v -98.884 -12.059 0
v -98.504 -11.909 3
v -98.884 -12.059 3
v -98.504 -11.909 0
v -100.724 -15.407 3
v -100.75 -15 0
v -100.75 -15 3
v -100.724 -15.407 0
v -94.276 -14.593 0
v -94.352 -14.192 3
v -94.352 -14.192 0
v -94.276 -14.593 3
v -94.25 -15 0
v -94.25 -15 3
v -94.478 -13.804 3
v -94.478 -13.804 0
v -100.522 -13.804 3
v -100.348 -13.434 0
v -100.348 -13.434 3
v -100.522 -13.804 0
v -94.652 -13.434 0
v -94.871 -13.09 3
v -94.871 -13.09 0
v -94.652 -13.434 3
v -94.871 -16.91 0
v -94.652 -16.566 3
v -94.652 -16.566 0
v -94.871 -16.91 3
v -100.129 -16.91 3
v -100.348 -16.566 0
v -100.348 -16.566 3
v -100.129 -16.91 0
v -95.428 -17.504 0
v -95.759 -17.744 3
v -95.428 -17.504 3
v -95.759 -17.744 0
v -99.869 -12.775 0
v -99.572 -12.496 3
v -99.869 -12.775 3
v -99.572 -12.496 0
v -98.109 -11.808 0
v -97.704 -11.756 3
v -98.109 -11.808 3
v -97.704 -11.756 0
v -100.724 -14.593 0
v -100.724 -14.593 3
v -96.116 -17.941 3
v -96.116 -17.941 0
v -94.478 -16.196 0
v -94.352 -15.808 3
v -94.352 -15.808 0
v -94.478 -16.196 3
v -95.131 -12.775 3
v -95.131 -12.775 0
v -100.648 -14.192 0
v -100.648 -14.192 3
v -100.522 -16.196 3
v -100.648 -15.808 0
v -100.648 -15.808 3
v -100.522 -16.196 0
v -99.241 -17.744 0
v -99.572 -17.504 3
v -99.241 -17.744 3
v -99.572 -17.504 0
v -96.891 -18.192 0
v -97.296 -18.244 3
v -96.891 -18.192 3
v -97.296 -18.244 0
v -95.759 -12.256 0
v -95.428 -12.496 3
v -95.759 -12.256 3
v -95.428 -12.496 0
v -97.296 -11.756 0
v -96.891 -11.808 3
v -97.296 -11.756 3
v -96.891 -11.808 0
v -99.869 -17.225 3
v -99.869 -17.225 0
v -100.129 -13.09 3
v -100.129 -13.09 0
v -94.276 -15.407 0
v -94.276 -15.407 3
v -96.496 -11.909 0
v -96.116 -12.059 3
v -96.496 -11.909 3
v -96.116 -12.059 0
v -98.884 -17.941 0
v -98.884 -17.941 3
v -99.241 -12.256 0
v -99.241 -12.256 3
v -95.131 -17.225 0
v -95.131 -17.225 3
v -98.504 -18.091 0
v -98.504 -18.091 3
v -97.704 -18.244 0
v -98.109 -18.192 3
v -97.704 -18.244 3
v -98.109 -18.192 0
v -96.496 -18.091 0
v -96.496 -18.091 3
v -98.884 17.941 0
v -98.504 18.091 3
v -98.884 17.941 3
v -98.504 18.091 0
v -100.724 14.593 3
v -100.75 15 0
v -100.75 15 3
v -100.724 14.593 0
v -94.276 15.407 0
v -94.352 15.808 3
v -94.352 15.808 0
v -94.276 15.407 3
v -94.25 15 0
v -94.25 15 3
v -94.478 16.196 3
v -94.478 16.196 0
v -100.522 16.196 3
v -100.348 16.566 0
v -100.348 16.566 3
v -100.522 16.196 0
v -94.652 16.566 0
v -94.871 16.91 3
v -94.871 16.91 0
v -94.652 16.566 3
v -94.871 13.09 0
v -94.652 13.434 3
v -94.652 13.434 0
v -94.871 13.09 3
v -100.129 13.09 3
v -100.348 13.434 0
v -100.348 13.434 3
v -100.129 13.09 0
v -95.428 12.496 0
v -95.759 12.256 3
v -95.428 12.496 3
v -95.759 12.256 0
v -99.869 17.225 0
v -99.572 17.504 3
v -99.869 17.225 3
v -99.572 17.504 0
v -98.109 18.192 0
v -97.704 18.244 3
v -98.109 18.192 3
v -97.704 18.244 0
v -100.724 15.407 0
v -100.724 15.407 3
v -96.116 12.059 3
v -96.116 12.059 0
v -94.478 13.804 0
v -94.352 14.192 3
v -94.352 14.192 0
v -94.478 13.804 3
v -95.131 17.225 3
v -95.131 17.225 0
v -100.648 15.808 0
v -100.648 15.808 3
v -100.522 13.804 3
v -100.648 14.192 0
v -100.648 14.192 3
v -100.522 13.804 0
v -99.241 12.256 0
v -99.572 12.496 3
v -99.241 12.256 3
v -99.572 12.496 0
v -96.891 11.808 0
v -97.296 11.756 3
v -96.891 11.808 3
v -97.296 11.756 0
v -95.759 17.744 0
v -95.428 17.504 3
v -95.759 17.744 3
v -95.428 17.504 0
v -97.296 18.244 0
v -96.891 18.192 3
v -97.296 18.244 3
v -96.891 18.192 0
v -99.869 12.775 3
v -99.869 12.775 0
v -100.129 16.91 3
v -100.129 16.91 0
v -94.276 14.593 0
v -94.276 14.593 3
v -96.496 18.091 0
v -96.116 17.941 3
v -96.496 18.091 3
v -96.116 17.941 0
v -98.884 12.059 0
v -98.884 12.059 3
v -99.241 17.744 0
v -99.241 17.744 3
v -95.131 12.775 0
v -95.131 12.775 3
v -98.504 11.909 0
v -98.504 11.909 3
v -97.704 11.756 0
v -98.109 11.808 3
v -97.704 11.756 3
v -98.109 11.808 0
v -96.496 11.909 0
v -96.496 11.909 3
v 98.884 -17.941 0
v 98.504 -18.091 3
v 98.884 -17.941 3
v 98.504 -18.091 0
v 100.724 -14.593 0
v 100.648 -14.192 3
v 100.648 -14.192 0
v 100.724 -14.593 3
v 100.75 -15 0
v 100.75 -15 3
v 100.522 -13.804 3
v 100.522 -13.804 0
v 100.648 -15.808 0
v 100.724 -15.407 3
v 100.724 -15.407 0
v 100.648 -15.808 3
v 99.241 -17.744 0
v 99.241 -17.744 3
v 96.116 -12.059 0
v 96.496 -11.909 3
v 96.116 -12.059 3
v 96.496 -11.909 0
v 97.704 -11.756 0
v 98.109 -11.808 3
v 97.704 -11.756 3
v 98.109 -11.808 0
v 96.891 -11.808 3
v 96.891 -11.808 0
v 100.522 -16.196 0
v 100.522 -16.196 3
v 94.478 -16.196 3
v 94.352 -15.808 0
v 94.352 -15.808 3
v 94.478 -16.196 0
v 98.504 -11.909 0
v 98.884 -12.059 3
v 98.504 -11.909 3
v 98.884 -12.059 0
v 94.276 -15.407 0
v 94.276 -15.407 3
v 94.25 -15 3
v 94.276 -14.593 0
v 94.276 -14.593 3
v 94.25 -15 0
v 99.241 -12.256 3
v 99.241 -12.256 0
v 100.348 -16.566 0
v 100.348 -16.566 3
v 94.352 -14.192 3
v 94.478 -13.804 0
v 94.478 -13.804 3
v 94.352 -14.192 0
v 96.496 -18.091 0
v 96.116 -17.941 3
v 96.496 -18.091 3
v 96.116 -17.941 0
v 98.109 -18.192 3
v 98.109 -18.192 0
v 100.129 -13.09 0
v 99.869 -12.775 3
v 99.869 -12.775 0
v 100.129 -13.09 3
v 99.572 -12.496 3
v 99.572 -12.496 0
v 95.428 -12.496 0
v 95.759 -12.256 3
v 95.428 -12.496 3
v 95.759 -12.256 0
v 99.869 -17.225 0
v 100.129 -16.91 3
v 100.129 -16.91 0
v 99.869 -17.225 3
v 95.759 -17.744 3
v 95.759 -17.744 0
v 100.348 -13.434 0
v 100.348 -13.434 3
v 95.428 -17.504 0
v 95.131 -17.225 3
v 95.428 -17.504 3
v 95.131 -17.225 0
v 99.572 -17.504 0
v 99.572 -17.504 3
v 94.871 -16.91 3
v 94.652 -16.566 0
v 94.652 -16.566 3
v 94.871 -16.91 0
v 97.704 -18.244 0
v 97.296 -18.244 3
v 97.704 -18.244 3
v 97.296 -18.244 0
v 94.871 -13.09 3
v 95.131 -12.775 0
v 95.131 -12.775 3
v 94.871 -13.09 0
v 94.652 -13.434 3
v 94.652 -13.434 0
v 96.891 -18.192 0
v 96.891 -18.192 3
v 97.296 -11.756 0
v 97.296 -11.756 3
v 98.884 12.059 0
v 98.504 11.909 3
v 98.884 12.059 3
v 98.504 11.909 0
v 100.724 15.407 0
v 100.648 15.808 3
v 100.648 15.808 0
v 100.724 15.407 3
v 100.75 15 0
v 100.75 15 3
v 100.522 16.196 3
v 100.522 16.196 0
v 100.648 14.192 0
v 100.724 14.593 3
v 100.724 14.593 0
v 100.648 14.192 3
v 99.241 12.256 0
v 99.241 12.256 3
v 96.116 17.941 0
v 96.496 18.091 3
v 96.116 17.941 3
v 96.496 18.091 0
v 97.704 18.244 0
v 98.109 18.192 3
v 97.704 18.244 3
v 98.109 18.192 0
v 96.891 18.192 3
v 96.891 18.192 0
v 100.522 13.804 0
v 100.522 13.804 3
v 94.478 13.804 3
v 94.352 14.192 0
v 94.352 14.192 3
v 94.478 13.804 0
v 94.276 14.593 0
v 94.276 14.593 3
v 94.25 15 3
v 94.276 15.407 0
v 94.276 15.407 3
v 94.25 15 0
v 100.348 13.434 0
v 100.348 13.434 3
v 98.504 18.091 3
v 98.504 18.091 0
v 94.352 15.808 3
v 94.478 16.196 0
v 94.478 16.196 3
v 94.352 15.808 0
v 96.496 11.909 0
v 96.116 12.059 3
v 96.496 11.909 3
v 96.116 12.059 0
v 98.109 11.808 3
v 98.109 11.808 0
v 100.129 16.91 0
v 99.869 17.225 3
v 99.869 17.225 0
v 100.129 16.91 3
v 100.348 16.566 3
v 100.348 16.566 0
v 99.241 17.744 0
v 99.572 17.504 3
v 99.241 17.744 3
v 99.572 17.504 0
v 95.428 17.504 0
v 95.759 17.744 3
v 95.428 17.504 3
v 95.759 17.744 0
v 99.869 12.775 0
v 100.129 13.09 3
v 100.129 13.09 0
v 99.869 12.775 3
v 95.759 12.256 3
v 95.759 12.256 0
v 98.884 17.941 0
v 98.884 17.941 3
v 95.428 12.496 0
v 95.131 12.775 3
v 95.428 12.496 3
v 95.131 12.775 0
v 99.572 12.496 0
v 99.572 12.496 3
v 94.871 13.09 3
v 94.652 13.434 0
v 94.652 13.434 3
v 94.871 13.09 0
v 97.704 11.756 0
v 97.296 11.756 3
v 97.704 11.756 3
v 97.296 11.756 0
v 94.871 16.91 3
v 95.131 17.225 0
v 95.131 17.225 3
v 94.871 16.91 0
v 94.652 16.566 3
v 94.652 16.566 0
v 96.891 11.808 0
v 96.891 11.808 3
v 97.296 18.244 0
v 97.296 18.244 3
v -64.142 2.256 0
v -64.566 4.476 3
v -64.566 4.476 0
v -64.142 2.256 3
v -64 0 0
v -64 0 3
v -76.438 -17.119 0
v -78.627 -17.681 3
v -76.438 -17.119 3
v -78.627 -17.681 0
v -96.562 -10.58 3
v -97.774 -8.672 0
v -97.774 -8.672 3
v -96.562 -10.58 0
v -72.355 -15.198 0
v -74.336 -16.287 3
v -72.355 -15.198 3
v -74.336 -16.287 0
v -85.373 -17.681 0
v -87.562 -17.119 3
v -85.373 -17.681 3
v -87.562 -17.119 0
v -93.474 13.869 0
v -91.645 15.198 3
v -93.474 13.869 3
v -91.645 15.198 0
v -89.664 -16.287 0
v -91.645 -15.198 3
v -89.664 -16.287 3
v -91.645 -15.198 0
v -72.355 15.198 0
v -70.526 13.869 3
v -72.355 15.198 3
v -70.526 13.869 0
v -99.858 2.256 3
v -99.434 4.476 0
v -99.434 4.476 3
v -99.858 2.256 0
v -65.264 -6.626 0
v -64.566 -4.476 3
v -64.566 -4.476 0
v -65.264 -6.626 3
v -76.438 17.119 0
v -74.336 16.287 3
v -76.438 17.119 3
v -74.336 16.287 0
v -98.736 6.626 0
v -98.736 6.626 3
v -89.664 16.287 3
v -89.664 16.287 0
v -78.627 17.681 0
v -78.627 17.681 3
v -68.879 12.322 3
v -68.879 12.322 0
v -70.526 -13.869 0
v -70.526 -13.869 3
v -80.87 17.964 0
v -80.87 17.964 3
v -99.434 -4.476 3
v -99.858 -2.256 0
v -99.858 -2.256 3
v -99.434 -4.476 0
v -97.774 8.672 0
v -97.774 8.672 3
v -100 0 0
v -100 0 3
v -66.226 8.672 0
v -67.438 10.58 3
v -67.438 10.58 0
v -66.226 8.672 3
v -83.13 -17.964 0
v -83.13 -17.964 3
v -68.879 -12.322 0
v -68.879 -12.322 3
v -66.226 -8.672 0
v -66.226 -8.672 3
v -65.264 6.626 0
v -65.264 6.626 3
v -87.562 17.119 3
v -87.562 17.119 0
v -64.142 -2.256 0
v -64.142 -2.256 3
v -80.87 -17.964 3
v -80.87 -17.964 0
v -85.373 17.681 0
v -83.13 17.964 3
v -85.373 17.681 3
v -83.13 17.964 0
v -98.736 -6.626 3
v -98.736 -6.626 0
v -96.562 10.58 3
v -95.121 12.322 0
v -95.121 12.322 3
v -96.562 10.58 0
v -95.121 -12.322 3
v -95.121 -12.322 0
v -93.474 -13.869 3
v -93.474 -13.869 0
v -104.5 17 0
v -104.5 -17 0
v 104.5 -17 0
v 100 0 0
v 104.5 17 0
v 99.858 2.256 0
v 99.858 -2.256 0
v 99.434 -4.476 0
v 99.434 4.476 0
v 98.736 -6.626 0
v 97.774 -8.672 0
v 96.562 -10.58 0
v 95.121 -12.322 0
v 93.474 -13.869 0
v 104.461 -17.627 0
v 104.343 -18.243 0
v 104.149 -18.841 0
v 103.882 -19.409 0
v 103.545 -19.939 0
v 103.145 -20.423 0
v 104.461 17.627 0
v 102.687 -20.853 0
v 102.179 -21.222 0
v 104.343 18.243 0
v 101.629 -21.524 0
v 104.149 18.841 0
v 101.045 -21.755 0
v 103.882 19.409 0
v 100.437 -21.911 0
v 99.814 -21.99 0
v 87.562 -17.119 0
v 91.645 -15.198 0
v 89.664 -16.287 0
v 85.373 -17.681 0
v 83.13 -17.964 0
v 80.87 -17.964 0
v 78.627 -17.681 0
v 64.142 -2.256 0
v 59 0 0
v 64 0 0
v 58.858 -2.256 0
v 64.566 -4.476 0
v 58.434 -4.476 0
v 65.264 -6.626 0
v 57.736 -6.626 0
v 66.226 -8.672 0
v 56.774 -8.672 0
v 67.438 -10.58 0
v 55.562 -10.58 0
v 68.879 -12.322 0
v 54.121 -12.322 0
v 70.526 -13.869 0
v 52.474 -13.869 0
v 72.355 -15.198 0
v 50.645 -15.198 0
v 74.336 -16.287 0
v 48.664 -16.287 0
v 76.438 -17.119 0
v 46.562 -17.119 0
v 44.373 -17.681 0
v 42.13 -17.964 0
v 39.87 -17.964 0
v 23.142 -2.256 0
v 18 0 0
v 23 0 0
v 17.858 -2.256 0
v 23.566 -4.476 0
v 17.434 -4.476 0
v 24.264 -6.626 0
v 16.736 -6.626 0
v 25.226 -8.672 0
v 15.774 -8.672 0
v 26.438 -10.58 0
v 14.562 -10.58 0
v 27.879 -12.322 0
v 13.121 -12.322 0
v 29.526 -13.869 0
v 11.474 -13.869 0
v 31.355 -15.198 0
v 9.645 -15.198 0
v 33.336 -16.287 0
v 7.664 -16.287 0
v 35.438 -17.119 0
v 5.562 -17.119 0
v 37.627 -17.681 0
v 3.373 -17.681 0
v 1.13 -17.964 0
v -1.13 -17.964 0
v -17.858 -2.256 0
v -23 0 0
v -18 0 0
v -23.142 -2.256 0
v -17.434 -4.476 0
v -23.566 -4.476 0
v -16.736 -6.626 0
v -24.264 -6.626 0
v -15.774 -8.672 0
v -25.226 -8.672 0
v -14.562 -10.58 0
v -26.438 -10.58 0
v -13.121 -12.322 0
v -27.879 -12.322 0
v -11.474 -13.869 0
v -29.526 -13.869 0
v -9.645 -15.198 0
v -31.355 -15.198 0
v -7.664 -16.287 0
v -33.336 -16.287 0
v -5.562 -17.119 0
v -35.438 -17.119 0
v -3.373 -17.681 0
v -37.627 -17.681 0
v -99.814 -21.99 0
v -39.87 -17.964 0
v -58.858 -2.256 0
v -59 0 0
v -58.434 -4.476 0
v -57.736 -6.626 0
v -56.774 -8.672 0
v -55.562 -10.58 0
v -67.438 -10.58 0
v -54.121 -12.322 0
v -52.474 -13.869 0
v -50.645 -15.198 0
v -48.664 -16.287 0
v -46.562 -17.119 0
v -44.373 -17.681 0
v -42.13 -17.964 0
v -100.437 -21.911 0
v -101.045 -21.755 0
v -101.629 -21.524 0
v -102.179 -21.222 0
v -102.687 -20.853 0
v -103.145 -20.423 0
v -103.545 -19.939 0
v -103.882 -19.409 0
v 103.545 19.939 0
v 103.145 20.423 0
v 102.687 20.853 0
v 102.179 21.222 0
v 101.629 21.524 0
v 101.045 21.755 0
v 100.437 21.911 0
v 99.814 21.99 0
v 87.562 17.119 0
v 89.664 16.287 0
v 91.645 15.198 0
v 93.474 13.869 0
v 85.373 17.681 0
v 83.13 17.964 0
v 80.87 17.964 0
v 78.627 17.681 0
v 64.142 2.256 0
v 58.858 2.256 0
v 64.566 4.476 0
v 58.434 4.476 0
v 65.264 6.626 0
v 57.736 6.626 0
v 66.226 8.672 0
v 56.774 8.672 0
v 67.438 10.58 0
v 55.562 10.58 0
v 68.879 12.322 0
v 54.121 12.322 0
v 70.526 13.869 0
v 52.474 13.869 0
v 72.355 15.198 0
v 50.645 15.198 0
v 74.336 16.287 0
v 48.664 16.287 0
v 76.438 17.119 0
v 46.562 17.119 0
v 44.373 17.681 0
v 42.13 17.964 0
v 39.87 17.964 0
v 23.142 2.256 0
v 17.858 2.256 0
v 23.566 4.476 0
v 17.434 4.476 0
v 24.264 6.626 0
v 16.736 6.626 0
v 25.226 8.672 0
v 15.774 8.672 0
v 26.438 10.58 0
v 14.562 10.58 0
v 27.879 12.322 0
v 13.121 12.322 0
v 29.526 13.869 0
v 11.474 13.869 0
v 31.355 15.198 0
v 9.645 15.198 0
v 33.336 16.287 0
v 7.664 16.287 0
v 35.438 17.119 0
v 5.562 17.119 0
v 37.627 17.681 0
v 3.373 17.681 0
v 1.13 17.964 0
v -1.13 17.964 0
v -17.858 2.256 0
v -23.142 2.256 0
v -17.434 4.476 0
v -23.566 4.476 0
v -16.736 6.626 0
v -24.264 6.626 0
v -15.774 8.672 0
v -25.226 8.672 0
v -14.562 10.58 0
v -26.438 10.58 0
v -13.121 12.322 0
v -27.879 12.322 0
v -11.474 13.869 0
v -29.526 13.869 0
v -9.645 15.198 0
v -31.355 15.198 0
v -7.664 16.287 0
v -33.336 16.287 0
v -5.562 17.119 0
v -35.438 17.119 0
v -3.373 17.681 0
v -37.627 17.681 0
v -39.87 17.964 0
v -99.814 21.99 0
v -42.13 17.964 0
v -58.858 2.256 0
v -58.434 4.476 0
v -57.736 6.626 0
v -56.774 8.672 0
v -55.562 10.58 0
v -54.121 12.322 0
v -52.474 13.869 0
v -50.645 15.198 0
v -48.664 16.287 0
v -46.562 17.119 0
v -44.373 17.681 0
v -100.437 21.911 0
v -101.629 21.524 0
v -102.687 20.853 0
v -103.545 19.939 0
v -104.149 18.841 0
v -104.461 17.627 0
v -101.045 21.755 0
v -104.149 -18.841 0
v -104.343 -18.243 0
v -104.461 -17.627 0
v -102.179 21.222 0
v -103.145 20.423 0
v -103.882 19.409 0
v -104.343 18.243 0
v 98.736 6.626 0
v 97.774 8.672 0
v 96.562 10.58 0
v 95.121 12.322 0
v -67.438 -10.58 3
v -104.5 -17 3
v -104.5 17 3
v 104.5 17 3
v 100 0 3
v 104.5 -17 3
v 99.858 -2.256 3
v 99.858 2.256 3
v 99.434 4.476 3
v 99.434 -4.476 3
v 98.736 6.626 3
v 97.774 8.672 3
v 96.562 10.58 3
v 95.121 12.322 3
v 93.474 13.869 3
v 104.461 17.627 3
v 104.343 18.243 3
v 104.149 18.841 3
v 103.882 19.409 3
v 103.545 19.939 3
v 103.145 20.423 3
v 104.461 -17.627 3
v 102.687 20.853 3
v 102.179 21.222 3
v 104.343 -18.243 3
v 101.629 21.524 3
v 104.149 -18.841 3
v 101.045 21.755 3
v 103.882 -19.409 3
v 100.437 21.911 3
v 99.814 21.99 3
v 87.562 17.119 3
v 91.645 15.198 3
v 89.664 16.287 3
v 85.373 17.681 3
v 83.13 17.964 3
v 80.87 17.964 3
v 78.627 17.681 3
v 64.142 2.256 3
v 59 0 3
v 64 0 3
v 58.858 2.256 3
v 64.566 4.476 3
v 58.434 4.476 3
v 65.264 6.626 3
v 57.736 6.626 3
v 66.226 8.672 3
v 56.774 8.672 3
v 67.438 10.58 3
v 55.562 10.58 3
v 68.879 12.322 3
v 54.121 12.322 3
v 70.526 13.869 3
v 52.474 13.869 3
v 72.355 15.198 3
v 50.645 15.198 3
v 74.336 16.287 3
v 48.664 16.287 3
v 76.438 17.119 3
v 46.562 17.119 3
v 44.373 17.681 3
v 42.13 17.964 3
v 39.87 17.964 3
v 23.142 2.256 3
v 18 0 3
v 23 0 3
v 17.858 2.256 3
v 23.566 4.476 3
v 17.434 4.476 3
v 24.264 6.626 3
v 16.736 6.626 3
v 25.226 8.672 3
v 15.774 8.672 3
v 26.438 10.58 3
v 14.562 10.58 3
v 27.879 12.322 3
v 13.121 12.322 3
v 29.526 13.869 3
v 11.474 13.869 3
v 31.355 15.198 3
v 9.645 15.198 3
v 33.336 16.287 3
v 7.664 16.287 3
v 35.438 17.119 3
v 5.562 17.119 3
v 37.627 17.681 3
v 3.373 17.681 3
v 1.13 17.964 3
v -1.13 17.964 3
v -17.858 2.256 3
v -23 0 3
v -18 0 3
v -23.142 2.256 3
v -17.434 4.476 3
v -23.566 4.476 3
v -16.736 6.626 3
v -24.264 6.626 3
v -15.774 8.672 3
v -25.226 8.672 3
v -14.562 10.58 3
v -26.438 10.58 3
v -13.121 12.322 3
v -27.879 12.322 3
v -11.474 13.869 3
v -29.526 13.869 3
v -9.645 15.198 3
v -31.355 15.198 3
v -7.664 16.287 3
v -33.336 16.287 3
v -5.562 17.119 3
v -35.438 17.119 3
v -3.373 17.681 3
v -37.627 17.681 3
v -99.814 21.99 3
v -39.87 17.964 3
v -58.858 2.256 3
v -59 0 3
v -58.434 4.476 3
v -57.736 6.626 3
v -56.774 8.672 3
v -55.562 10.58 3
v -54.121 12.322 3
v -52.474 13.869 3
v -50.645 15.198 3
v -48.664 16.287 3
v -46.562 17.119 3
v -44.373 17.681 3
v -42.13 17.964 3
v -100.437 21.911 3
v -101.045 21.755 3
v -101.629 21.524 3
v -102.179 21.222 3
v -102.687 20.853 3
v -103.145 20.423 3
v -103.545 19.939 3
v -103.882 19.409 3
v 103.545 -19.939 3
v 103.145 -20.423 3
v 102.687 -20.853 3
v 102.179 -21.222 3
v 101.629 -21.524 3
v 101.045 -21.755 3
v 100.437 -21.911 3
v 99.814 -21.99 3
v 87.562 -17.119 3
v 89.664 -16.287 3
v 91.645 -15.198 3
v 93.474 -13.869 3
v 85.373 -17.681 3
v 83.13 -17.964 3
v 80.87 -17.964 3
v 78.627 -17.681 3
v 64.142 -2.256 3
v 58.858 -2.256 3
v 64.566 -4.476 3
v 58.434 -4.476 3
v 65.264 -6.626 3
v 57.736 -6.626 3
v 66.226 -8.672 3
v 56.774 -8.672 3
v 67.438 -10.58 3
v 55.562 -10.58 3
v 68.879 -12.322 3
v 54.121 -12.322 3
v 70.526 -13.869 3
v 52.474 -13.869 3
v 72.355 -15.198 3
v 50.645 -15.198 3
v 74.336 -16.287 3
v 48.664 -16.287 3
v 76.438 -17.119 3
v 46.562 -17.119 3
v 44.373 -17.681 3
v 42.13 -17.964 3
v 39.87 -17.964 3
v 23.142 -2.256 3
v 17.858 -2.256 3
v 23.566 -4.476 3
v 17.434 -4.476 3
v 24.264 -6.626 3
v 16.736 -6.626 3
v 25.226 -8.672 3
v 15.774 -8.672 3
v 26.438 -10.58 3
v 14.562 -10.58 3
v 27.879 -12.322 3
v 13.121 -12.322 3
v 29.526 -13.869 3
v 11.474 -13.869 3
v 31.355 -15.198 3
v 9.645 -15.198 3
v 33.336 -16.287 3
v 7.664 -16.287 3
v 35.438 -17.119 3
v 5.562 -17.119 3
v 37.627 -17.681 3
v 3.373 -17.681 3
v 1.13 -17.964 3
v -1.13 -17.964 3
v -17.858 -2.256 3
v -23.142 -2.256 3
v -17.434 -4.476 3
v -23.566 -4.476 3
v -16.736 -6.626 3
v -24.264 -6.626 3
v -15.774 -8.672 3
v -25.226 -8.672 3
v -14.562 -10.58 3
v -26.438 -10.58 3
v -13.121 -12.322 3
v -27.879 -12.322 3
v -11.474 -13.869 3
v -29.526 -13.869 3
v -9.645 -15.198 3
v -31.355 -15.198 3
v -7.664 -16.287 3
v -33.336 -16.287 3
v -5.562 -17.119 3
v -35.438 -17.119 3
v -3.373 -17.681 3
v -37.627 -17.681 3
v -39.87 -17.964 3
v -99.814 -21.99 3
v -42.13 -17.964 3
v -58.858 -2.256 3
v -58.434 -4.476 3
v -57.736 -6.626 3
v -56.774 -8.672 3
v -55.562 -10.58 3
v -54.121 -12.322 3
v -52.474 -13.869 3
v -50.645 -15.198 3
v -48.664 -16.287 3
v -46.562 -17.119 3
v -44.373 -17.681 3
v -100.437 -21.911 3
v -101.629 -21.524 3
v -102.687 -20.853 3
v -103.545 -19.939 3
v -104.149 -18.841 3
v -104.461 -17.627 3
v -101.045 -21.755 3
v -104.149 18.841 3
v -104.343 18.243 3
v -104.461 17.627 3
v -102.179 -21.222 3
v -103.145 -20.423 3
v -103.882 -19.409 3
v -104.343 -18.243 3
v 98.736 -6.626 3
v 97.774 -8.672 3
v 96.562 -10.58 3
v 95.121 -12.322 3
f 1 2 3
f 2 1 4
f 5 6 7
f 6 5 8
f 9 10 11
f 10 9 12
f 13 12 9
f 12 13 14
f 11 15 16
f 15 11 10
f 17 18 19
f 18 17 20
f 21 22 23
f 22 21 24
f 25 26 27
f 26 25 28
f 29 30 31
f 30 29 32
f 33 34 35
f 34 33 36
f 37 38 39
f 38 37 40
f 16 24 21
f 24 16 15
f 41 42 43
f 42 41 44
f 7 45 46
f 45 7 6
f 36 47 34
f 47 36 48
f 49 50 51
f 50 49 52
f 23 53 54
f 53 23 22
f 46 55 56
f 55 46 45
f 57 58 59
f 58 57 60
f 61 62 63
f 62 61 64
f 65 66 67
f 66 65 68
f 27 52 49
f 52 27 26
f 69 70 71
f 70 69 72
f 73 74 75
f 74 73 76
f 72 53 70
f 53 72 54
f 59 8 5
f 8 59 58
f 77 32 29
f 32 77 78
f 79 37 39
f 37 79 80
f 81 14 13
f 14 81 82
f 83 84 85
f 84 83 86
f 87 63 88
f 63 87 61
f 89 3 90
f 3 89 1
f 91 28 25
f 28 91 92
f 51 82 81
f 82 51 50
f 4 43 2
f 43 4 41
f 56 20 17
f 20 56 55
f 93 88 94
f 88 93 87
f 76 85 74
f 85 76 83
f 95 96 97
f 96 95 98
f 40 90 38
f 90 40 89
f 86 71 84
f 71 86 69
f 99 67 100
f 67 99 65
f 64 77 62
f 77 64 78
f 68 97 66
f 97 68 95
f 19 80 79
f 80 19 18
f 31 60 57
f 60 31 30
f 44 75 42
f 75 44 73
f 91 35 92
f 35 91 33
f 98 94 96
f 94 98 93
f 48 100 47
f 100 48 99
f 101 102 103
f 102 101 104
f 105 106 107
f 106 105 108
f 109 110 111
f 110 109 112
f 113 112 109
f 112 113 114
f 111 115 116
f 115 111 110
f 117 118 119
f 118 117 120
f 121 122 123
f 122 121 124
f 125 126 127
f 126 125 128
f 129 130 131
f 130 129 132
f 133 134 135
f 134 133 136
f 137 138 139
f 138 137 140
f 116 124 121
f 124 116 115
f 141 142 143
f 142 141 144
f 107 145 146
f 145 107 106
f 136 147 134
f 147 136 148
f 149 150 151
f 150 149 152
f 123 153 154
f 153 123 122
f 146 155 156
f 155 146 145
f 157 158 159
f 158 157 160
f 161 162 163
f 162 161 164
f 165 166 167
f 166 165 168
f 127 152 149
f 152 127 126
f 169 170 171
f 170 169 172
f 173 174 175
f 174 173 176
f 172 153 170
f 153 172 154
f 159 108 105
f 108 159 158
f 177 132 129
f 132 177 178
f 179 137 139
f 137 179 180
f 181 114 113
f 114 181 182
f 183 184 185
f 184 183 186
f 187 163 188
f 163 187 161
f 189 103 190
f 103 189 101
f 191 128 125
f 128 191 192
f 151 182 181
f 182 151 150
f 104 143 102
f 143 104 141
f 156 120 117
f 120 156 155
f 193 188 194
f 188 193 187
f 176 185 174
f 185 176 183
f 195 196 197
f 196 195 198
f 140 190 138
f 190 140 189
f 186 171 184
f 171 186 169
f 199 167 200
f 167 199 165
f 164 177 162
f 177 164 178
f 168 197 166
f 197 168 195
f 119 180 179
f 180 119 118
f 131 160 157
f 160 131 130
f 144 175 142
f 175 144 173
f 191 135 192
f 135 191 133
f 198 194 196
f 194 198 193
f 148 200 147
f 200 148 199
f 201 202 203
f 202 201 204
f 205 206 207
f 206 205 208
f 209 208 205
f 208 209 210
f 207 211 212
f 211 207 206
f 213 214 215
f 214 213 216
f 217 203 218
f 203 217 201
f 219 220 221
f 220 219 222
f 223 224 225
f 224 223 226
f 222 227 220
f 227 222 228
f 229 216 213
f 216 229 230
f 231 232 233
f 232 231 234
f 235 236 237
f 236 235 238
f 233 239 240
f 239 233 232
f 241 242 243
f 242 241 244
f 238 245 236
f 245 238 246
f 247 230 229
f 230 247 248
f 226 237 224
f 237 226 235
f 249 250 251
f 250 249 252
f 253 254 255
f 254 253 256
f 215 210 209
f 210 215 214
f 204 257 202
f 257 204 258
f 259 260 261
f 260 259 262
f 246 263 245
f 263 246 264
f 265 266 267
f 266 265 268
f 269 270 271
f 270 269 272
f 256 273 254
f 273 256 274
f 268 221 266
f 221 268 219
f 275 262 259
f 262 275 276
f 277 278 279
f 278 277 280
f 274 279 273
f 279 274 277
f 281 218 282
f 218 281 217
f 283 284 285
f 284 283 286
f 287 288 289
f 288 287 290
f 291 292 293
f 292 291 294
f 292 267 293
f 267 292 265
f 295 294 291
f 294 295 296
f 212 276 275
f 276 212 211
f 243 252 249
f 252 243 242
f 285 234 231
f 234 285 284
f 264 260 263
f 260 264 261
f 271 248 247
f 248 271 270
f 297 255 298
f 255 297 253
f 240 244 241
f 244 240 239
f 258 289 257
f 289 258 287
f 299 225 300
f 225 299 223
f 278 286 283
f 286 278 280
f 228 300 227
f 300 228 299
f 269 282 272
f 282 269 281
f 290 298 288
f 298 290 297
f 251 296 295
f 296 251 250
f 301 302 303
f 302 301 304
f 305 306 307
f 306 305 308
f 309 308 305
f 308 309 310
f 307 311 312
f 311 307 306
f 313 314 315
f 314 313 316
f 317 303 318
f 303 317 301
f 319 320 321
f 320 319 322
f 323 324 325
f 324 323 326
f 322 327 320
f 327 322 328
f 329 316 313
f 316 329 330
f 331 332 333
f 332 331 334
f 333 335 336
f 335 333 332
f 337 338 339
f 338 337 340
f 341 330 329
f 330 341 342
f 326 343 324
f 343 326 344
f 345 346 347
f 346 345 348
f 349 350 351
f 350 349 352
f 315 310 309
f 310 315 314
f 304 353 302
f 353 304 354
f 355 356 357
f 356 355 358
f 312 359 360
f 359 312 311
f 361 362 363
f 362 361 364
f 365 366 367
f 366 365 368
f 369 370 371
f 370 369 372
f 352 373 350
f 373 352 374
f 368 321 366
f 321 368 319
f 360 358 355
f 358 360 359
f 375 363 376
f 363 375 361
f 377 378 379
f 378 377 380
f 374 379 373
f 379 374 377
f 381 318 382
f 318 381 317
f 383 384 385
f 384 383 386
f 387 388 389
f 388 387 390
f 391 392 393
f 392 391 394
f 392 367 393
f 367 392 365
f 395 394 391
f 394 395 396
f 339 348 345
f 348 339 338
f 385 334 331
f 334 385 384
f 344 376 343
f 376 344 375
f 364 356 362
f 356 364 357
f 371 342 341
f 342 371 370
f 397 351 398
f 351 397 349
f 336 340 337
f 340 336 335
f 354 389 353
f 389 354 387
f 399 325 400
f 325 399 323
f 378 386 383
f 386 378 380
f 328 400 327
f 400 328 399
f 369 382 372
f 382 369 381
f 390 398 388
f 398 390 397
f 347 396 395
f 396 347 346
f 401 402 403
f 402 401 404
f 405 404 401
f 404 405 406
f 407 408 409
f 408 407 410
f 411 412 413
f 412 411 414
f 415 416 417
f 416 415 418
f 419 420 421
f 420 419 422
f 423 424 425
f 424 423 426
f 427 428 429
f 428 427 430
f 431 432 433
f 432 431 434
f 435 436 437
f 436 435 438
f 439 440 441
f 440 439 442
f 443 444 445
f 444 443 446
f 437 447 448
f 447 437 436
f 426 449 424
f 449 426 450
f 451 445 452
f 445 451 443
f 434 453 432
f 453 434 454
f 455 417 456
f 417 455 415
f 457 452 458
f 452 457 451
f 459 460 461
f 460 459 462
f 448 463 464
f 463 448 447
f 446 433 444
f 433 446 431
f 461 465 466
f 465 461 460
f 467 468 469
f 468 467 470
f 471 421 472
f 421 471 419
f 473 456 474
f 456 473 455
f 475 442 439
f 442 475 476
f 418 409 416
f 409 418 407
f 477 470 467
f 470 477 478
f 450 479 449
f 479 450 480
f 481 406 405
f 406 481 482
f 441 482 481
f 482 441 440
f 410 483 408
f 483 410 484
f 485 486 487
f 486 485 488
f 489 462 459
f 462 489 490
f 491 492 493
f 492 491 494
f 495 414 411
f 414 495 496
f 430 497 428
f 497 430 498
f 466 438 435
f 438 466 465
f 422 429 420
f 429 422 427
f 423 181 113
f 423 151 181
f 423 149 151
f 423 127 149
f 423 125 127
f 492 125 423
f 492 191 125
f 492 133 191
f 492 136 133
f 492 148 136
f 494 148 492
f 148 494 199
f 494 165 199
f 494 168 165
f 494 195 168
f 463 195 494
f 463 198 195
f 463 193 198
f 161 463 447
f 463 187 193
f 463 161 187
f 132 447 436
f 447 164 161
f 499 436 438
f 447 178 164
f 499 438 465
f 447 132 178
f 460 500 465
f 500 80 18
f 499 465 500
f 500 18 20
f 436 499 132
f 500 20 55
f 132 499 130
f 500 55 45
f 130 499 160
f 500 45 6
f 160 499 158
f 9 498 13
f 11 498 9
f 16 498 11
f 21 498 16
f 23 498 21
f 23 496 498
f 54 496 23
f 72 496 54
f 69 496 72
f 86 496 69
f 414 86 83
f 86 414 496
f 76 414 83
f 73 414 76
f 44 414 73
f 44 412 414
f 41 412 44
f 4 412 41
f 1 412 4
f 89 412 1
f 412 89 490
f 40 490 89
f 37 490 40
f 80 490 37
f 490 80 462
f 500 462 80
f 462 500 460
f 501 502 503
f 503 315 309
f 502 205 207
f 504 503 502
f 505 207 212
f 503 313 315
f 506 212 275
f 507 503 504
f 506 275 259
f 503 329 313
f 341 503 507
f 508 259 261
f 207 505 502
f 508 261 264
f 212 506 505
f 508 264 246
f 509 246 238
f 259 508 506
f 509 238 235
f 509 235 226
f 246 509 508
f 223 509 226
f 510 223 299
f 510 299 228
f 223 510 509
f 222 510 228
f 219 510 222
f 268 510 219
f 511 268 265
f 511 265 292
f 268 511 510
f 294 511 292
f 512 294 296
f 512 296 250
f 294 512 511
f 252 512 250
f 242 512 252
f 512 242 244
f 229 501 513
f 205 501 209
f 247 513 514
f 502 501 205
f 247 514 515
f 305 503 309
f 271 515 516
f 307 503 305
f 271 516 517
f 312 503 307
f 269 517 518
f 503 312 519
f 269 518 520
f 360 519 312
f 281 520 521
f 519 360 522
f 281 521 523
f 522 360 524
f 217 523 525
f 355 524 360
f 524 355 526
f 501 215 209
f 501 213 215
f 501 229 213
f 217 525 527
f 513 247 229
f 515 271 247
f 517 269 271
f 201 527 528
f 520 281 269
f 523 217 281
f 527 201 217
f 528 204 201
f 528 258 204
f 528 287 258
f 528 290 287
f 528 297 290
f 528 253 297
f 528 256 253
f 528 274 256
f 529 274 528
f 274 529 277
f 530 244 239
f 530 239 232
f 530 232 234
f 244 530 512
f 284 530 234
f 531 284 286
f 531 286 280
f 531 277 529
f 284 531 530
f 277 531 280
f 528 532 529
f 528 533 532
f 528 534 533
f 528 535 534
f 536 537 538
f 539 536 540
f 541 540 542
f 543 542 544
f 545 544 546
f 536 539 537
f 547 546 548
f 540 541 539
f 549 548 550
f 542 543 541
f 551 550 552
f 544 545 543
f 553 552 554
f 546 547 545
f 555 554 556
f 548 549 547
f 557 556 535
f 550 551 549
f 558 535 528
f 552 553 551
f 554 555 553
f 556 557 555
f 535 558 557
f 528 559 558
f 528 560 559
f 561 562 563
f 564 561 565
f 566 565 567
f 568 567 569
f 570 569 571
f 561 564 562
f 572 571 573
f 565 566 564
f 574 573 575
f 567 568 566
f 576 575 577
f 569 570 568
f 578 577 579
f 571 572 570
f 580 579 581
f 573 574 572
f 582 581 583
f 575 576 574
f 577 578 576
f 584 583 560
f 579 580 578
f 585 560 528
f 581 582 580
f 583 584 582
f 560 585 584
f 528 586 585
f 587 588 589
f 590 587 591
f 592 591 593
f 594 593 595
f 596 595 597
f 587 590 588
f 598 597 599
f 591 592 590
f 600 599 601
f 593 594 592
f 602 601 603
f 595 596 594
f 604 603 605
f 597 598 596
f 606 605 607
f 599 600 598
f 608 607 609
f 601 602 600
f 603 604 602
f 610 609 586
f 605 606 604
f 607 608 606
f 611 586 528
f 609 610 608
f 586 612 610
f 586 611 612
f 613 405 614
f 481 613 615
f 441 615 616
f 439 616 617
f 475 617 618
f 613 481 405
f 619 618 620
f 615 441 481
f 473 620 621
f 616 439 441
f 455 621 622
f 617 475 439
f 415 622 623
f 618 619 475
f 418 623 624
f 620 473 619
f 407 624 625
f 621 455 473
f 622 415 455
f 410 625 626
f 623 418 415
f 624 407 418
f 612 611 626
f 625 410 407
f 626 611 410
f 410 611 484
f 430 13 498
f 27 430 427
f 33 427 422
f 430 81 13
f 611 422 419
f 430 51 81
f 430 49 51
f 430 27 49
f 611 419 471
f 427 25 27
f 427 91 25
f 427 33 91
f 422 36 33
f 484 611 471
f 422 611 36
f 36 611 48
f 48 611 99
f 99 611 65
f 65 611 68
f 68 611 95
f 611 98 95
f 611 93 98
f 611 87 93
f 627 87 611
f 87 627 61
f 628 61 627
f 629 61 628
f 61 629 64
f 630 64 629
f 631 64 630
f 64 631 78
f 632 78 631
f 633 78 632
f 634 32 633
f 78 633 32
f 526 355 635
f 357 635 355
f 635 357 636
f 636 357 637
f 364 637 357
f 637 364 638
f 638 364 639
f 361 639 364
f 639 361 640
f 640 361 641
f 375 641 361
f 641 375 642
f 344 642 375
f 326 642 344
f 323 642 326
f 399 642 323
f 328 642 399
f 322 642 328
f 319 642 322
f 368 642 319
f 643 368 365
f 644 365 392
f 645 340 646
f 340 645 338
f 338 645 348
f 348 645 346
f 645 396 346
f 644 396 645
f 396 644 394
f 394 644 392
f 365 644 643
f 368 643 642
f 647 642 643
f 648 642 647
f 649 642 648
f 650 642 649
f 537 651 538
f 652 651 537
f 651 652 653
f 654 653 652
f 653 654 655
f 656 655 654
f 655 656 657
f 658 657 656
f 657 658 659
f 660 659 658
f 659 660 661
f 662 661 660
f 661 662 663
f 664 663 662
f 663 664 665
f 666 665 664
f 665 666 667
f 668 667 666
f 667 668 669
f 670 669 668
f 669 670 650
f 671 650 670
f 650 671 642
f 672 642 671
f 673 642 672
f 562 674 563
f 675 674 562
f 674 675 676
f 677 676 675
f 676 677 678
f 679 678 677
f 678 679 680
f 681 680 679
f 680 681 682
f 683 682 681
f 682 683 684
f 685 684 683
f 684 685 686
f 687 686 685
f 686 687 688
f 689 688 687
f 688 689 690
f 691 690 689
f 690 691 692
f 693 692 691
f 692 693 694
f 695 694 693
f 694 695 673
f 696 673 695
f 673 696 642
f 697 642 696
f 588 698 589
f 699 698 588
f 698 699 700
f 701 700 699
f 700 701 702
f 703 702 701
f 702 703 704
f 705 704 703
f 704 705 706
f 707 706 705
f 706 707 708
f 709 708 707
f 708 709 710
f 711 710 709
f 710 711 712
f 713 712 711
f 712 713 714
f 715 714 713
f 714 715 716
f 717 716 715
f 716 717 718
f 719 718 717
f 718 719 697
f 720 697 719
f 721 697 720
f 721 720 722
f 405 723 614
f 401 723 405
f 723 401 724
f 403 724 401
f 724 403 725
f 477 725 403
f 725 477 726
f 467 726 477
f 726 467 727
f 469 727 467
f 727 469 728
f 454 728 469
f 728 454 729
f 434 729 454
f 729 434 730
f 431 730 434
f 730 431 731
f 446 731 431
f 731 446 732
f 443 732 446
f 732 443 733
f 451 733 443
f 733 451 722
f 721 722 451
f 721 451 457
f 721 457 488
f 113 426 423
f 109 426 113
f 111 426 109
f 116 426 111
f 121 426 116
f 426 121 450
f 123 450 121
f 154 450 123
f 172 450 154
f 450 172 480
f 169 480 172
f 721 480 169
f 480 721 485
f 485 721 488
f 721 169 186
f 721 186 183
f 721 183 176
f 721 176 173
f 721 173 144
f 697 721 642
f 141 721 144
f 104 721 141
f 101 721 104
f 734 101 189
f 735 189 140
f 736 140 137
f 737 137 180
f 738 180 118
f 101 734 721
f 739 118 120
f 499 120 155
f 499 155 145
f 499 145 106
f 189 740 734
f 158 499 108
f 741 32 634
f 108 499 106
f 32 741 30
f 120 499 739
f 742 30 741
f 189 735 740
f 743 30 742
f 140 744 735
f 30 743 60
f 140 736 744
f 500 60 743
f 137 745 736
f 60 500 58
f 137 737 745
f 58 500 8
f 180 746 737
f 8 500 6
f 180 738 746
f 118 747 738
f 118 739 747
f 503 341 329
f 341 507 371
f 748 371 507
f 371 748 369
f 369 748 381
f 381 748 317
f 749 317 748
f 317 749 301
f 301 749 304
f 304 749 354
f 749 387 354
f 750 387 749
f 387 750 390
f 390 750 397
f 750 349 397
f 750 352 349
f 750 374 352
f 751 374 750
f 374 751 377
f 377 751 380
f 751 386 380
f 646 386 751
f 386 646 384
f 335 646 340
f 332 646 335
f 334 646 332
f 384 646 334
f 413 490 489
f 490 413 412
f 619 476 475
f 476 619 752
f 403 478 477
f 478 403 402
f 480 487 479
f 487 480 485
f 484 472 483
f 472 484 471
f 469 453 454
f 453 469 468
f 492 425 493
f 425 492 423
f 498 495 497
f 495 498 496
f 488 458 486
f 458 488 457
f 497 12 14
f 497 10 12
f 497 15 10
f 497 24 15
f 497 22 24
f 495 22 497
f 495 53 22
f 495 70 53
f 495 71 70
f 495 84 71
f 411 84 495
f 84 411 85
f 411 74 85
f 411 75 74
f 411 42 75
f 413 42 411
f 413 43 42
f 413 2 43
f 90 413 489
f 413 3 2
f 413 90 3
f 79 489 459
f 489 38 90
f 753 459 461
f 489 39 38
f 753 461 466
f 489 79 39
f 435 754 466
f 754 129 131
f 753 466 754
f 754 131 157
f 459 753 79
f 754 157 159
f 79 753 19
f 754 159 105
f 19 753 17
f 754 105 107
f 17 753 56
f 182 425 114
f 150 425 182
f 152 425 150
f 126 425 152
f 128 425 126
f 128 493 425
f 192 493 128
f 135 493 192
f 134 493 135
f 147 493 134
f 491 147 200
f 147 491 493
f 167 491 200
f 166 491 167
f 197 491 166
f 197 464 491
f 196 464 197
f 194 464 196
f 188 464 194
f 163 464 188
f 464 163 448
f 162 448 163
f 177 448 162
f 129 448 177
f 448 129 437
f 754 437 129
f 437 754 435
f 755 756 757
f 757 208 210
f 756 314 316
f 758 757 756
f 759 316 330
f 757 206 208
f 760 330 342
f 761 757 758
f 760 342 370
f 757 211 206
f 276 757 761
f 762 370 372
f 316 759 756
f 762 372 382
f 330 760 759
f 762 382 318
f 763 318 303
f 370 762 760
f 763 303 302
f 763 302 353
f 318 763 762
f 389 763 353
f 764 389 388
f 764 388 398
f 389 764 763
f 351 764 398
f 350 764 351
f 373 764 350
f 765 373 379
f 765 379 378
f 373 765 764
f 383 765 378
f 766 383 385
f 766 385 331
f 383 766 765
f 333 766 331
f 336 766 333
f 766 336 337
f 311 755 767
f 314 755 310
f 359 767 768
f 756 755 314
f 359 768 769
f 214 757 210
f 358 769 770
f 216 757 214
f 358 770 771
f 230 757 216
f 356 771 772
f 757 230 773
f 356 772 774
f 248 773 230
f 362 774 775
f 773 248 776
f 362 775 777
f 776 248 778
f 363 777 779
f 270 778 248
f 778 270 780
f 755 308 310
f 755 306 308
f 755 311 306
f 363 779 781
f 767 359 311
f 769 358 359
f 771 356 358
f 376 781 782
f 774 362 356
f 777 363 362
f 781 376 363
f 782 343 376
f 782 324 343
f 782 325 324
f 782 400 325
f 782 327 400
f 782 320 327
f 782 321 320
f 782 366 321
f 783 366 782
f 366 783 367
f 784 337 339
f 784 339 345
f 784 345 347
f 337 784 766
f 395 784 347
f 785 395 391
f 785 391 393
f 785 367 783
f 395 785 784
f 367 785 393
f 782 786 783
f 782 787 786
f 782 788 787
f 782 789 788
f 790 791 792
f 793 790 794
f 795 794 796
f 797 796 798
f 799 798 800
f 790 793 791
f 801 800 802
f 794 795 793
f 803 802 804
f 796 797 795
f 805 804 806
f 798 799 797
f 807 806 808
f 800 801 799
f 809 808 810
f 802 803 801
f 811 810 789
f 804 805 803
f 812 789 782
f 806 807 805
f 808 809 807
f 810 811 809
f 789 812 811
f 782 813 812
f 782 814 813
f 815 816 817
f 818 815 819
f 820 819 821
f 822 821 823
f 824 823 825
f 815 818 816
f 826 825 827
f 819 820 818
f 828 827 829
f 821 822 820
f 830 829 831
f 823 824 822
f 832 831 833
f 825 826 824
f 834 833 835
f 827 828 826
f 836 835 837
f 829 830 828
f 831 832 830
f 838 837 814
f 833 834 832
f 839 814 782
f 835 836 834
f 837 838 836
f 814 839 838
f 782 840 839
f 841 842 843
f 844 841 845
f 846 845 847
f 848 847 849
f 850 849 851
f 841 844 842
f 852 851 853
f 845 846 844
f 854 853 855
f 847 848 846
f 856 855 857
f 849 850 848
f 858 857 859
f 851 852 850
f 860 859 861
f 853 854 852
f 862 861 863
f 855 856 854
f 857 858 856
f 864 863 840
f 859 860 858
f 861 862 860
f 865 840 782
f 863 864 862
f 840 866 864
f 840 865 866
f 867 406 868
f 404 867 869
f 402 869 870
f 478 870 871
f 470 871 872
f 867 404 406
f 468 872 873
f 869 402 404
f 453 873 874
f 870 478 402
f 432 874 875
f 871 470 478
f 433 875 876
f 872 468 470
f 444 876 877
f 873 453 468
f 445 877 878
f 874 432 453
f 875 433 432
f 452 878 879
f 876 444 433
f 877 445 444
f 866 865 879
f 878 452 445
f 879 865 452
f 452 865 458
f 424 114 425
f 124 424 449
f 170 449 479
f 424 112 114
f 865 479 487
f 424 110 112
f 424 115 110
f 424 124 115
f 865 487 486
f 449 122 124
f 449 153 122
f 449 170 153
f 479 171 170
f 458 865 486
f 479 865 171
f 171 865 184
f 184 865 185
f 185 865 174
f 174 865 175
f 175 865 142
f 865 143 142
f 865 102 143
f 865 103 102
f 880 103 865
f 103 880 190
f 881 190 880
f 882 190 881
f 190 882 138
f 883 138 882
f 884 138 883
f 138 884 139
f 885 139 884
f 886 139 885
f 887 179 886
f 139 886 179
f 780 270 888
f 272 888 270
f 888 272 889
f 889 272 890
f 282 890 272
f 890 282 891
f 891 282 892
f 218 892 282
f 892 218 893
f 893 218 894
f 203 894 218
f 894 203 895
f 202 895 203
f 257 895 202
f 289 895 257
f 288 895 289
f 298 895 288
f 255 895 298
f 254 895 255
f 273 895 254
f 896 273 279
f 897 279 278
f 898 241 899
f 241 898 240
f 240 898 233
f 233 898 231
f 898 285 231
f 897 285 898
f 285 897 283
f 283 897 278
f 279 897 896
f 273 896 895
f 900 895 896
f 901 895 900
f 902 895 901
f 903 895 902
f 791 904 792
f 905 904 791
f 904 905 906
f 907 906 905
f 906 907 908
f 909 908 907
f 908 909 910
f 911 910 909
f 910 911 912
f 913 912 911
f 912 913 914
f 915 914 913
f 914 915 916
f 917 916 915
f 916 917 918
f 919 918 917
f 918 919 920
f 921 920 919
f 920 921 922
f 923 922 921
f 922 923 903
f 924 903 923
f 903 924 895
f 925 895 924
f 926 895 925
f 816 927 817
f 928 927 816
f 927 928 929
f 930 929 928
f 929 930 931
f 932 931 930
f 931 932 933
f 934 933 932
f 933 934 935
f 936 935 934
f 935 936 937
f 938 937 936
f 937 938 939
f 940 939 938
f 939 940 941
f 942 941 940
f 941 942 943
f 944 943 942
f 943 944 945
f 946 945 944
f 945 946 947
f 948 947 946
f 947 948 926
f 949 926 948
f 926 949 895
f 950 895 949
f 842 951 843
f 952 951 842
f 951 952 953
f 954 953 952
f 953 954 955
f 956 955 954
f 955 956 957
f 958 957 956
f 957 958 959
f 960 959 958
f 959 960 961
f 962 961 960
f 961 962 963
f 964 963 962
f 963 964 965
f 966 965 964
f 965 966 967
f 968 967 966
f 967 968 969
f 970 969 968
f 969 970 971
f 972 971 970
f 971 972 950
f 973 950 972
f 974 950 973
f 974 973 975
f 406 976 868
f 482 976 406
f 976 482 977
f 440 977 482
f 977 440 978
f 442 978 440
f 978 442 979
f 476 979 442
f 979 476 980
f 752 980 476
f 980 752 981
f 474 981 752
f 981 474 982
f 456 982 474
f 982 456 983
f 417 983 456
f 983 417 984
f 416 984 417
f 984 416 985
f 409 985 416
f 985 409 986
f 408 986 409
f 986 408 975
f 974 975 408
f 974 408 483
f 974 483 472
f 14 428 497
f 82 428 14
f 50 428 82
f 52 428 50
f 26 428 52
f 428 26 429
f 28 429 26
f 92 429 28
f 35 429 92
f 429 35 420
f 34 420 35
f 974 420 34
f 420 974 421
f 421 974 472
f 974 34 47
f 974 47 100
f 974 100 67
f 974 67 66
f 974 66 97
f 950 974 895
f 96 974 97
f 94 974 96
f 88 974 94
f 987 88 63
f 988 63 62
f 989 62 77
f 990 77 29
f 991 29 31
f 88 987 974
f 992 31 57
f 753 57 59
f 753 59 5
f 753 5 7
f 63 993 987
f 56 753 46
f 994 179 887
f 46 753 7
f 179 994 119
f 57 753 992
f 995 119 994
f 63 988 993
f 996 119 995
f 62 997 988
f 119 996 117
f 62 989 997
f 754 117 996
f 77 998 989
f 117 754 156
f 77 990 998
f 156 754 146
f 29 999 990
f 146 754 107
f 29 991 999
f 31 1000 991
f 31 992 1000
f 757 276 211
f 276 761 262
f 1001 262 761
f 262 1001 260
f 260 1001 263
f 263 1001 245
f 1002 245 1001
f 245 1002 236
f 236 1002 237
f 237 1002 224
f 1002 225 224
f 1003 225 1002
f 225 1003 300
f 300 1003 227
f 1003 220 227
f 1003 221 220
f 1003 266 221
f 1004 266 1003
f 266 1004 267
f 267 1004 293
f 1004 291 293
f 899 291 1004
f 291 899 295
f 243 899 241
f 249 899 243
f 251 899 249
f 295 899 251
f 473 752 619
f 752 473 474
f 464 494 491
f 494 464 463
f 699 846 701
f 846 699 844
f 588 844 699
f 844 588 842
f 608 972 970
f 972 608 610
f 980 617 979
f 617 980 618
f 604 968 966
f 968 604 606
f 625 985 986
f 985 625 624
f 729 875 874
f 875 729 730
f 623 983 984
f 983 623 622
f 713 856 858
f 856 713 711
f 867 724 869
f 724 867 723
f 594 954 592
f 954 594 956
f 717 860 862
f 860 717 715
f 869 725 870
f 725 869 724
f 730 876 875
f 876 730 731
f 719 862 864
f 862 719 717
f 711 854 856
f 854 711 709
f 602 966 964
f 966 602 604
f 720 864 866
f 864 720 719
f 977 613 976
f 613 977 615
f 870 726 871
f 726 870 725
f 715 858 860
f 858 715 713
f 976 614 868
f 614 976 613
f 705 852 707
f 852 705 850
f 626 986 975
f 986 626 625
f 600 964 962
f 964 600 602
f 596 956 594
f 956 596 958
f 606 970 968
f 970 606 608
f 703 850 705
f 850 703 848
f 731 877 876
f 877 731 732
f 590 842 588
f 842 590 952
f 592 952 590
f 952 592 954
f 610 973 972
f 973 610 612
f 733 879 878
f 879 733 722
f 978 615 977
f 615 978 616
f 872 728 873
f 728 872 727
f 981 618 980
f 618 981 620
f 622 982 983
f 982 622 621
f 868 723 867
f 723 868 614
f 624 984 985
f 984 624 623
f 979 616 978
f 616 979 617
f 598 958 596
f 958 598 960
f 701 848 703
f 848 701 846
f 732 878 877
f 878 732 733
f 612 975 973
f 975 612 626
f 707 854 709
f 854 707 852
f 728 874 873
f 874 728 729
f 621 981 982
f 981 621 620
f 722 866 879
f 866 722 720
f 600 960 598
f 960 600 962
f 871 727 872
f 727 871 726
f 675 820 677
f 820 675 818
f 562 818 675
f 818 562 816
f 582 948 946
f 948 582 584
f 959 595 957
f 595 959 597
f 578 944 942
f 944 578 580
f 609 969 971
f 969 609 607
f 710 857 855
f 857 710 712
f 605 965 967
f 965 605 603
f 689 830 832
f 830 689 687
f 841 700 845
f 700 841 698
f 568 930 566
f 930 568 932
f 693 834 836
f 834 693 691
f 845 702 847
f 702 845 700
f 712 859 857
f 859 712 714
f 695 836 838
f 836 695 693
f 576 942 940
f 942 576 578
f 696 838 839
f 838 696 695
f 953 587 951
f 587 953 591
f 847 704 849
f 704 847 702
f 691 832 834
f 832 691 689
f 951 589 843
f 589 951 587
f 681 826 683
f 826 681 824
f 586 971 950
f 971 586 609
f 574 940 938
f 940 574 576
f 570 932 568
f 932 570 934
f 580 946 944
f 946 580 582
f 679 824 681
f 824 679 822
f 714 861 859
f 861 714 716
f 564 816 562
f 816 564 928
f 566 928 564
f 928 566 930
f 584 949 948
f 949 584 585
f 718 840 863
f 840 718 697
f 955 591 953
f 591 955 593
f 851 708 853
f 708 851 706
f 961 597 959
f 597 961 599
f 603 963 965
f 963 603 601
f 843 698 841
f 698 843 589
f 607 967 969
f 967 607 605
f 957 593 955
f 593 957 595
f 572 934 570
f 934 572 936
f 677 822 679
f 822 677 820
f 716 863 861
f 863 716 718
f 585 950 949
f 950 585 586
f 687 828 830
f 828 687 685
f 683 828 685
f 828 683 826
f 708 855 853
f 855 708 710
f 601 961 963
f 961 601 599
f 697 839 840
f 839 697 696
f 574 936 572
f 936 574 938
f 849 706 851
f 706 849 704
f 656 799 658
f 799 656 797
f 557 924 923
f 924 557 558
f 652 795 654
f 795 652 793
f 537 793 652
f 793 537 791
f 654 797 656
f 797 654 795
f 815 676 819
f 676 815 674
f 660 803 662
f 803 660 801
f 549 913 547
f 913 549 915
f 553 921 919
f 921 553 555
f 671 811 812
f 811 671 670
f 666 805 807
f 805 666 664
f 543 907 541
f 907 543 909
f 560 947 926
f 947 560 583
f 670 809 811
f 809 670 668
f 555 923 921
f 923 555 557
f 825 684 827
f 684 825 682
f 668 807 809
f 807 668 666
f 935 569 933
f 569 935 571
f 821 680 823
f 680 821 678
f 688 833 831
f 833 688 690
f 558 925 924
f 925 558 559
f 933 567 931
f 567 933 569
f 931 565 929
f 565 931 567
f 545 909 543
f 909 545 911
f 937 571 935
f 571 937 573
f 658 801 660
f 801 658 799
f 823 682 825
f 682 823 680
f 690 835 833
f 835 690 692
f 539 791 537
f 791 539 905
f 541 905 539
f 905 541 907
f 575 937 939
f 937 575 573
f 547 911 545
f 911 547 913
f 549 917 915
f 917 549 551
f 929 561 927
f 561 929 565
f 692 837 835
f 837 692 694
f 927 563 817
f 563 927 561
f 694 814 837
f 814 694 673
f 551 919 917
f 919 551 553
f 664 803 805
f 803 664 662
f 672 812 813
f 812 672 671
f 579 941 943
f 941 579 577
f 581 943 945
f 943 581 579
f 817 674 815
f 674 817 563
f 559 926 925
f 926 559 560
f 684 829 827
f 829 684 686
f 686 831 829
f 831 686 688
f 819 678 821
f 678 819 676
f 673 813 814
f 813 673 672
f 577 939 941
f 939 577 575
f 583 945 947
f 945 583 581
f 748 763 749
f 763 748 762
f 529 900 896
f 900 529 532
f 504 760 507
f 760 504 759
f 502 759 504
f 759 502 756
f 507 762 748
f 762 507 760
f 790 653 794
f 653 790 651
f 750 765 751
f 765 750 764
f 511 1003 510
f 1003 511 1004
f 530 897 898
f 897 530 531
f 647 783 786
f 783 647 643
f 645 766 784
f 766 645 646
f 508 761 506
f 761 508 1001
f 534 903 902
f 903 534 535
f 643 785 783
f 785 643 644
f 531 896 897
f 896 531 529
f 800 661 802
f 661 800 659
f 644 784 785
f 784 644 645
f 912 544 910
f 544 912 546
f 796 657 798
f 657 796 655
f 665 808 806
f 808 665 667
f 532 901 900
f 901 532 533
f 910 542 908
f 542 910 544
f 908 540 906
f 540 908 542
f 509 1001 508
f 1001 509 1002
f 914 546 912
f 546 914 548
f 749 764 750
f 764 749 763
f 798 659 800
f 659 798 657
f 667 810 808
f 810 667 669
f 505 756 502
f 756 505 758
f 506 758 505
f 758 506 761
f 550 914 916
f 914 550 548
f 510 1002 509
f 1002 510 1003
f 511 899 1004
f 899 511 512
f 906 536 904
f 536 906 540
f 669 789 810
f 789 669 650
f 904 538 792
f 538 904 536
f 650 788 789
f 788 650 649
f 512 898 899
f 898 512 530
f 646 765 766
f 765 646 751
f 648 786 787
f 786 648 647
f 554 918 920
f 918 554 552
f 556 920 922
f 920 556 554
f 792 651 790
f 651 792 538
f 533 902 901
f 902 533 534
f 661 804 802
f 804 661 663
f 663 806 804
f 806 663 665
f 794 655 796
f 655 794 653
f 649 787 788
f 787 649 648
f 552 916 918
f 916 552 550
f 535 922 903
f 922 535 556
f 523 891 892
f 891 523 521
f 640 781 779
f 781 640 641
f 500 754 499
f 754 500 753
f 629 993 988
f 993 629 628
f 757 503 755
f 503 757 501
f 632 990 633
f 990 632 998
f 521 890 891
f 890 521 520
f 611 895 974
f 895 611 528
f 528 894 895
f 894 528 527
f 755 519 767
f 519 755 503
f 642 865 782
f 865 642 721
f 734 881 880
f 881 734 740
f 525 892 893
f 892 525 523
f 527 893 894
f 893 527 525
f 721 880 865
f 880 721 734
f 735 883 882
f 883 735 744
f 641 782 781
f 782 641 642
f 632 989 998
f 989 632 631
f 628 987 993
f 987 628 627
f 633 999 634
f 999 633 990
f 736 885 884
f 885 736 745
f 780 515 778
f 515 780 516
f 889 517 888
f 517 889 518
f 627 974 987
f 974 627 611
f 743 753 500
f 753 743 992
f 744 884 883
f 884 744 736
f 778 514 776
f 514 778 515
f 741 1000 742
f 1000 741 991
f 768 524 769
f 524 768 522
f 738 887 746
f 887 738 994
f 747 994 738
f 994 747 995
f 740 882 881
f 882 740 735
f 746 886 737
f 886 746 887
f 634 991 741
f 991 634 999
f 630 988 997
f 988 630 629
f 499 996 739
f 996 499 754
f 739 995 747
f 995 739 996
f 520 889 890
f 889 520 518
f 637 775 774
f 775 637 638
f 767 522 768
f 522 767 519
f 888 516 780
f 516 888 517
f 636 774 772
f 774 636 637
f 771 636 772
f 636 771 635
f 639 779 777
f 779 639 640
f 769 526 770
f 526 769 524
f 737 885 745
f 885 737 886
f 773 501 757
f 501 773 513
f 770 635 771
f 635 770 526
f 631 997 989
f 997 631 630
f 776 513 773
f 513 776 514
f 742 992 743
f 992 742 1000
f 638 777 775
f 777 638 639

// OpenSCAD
$fn = 50;


difference() {
	union() {
		hull() {
			translate(v = [-99.5000000000, 17.0000000000, 0]) {
				cylinder(h = 3, r = 5);
			}
			translate(v = [99.5000000000, 17.0000000000, 0]) {
				cylinder(h = 3, r = 5);
			}
			translate(v = [-99.5000000000, -17.0000000000, 0]) {
				cylinder(h = 3, r = 5);
			}
			translate(v = [99.5000000000, -17.0000000000, 0]) {
				cylinder(h = 3, r = 5);
			}
		}
	}
	union() {
		#translate(v = [-97.5000000000, -15.0000000000, -100.0000000000]) {
			cylinder(h = 200, r = 3.2500000000);
		}
		#translate(v = [-97.5000000000, 15.0000000000, -100.0000000000]) {
			cylinder(h = 200, r = 3.2500000000);
		}
		#translate(v = [97.5000000000, -15.0000000000, -100.0000000000]) {
			cylinder(h = 200, r = 3.2500000000);
		}
		#translate(v = [97.5000000000, 15.0000000000, -100.0000000000]) {
			cylinder(h = 200, r = 3.2500000000);
		}
		#translate(v = [-82.0000000000, 0, 0]) {
			cylinder(h = 3, r = 18.0000000000);
		}
		#translate(v = [-41.0000000000, 0, 0]) {
			cylinder(h = 3, r = 18.0000000000);
		}
		#cylinder(h = 3, r = 18.0000000000);
		#translate(v = [41.0000000000, 0, 0]) {
			cylinder(h = 3, r = 18.0000000000);
		}
		#translate(v = [82.0000000000, 0, 0]) {
			cylinder(h = 3, r = 18.0000000000);
		}
	}
}
